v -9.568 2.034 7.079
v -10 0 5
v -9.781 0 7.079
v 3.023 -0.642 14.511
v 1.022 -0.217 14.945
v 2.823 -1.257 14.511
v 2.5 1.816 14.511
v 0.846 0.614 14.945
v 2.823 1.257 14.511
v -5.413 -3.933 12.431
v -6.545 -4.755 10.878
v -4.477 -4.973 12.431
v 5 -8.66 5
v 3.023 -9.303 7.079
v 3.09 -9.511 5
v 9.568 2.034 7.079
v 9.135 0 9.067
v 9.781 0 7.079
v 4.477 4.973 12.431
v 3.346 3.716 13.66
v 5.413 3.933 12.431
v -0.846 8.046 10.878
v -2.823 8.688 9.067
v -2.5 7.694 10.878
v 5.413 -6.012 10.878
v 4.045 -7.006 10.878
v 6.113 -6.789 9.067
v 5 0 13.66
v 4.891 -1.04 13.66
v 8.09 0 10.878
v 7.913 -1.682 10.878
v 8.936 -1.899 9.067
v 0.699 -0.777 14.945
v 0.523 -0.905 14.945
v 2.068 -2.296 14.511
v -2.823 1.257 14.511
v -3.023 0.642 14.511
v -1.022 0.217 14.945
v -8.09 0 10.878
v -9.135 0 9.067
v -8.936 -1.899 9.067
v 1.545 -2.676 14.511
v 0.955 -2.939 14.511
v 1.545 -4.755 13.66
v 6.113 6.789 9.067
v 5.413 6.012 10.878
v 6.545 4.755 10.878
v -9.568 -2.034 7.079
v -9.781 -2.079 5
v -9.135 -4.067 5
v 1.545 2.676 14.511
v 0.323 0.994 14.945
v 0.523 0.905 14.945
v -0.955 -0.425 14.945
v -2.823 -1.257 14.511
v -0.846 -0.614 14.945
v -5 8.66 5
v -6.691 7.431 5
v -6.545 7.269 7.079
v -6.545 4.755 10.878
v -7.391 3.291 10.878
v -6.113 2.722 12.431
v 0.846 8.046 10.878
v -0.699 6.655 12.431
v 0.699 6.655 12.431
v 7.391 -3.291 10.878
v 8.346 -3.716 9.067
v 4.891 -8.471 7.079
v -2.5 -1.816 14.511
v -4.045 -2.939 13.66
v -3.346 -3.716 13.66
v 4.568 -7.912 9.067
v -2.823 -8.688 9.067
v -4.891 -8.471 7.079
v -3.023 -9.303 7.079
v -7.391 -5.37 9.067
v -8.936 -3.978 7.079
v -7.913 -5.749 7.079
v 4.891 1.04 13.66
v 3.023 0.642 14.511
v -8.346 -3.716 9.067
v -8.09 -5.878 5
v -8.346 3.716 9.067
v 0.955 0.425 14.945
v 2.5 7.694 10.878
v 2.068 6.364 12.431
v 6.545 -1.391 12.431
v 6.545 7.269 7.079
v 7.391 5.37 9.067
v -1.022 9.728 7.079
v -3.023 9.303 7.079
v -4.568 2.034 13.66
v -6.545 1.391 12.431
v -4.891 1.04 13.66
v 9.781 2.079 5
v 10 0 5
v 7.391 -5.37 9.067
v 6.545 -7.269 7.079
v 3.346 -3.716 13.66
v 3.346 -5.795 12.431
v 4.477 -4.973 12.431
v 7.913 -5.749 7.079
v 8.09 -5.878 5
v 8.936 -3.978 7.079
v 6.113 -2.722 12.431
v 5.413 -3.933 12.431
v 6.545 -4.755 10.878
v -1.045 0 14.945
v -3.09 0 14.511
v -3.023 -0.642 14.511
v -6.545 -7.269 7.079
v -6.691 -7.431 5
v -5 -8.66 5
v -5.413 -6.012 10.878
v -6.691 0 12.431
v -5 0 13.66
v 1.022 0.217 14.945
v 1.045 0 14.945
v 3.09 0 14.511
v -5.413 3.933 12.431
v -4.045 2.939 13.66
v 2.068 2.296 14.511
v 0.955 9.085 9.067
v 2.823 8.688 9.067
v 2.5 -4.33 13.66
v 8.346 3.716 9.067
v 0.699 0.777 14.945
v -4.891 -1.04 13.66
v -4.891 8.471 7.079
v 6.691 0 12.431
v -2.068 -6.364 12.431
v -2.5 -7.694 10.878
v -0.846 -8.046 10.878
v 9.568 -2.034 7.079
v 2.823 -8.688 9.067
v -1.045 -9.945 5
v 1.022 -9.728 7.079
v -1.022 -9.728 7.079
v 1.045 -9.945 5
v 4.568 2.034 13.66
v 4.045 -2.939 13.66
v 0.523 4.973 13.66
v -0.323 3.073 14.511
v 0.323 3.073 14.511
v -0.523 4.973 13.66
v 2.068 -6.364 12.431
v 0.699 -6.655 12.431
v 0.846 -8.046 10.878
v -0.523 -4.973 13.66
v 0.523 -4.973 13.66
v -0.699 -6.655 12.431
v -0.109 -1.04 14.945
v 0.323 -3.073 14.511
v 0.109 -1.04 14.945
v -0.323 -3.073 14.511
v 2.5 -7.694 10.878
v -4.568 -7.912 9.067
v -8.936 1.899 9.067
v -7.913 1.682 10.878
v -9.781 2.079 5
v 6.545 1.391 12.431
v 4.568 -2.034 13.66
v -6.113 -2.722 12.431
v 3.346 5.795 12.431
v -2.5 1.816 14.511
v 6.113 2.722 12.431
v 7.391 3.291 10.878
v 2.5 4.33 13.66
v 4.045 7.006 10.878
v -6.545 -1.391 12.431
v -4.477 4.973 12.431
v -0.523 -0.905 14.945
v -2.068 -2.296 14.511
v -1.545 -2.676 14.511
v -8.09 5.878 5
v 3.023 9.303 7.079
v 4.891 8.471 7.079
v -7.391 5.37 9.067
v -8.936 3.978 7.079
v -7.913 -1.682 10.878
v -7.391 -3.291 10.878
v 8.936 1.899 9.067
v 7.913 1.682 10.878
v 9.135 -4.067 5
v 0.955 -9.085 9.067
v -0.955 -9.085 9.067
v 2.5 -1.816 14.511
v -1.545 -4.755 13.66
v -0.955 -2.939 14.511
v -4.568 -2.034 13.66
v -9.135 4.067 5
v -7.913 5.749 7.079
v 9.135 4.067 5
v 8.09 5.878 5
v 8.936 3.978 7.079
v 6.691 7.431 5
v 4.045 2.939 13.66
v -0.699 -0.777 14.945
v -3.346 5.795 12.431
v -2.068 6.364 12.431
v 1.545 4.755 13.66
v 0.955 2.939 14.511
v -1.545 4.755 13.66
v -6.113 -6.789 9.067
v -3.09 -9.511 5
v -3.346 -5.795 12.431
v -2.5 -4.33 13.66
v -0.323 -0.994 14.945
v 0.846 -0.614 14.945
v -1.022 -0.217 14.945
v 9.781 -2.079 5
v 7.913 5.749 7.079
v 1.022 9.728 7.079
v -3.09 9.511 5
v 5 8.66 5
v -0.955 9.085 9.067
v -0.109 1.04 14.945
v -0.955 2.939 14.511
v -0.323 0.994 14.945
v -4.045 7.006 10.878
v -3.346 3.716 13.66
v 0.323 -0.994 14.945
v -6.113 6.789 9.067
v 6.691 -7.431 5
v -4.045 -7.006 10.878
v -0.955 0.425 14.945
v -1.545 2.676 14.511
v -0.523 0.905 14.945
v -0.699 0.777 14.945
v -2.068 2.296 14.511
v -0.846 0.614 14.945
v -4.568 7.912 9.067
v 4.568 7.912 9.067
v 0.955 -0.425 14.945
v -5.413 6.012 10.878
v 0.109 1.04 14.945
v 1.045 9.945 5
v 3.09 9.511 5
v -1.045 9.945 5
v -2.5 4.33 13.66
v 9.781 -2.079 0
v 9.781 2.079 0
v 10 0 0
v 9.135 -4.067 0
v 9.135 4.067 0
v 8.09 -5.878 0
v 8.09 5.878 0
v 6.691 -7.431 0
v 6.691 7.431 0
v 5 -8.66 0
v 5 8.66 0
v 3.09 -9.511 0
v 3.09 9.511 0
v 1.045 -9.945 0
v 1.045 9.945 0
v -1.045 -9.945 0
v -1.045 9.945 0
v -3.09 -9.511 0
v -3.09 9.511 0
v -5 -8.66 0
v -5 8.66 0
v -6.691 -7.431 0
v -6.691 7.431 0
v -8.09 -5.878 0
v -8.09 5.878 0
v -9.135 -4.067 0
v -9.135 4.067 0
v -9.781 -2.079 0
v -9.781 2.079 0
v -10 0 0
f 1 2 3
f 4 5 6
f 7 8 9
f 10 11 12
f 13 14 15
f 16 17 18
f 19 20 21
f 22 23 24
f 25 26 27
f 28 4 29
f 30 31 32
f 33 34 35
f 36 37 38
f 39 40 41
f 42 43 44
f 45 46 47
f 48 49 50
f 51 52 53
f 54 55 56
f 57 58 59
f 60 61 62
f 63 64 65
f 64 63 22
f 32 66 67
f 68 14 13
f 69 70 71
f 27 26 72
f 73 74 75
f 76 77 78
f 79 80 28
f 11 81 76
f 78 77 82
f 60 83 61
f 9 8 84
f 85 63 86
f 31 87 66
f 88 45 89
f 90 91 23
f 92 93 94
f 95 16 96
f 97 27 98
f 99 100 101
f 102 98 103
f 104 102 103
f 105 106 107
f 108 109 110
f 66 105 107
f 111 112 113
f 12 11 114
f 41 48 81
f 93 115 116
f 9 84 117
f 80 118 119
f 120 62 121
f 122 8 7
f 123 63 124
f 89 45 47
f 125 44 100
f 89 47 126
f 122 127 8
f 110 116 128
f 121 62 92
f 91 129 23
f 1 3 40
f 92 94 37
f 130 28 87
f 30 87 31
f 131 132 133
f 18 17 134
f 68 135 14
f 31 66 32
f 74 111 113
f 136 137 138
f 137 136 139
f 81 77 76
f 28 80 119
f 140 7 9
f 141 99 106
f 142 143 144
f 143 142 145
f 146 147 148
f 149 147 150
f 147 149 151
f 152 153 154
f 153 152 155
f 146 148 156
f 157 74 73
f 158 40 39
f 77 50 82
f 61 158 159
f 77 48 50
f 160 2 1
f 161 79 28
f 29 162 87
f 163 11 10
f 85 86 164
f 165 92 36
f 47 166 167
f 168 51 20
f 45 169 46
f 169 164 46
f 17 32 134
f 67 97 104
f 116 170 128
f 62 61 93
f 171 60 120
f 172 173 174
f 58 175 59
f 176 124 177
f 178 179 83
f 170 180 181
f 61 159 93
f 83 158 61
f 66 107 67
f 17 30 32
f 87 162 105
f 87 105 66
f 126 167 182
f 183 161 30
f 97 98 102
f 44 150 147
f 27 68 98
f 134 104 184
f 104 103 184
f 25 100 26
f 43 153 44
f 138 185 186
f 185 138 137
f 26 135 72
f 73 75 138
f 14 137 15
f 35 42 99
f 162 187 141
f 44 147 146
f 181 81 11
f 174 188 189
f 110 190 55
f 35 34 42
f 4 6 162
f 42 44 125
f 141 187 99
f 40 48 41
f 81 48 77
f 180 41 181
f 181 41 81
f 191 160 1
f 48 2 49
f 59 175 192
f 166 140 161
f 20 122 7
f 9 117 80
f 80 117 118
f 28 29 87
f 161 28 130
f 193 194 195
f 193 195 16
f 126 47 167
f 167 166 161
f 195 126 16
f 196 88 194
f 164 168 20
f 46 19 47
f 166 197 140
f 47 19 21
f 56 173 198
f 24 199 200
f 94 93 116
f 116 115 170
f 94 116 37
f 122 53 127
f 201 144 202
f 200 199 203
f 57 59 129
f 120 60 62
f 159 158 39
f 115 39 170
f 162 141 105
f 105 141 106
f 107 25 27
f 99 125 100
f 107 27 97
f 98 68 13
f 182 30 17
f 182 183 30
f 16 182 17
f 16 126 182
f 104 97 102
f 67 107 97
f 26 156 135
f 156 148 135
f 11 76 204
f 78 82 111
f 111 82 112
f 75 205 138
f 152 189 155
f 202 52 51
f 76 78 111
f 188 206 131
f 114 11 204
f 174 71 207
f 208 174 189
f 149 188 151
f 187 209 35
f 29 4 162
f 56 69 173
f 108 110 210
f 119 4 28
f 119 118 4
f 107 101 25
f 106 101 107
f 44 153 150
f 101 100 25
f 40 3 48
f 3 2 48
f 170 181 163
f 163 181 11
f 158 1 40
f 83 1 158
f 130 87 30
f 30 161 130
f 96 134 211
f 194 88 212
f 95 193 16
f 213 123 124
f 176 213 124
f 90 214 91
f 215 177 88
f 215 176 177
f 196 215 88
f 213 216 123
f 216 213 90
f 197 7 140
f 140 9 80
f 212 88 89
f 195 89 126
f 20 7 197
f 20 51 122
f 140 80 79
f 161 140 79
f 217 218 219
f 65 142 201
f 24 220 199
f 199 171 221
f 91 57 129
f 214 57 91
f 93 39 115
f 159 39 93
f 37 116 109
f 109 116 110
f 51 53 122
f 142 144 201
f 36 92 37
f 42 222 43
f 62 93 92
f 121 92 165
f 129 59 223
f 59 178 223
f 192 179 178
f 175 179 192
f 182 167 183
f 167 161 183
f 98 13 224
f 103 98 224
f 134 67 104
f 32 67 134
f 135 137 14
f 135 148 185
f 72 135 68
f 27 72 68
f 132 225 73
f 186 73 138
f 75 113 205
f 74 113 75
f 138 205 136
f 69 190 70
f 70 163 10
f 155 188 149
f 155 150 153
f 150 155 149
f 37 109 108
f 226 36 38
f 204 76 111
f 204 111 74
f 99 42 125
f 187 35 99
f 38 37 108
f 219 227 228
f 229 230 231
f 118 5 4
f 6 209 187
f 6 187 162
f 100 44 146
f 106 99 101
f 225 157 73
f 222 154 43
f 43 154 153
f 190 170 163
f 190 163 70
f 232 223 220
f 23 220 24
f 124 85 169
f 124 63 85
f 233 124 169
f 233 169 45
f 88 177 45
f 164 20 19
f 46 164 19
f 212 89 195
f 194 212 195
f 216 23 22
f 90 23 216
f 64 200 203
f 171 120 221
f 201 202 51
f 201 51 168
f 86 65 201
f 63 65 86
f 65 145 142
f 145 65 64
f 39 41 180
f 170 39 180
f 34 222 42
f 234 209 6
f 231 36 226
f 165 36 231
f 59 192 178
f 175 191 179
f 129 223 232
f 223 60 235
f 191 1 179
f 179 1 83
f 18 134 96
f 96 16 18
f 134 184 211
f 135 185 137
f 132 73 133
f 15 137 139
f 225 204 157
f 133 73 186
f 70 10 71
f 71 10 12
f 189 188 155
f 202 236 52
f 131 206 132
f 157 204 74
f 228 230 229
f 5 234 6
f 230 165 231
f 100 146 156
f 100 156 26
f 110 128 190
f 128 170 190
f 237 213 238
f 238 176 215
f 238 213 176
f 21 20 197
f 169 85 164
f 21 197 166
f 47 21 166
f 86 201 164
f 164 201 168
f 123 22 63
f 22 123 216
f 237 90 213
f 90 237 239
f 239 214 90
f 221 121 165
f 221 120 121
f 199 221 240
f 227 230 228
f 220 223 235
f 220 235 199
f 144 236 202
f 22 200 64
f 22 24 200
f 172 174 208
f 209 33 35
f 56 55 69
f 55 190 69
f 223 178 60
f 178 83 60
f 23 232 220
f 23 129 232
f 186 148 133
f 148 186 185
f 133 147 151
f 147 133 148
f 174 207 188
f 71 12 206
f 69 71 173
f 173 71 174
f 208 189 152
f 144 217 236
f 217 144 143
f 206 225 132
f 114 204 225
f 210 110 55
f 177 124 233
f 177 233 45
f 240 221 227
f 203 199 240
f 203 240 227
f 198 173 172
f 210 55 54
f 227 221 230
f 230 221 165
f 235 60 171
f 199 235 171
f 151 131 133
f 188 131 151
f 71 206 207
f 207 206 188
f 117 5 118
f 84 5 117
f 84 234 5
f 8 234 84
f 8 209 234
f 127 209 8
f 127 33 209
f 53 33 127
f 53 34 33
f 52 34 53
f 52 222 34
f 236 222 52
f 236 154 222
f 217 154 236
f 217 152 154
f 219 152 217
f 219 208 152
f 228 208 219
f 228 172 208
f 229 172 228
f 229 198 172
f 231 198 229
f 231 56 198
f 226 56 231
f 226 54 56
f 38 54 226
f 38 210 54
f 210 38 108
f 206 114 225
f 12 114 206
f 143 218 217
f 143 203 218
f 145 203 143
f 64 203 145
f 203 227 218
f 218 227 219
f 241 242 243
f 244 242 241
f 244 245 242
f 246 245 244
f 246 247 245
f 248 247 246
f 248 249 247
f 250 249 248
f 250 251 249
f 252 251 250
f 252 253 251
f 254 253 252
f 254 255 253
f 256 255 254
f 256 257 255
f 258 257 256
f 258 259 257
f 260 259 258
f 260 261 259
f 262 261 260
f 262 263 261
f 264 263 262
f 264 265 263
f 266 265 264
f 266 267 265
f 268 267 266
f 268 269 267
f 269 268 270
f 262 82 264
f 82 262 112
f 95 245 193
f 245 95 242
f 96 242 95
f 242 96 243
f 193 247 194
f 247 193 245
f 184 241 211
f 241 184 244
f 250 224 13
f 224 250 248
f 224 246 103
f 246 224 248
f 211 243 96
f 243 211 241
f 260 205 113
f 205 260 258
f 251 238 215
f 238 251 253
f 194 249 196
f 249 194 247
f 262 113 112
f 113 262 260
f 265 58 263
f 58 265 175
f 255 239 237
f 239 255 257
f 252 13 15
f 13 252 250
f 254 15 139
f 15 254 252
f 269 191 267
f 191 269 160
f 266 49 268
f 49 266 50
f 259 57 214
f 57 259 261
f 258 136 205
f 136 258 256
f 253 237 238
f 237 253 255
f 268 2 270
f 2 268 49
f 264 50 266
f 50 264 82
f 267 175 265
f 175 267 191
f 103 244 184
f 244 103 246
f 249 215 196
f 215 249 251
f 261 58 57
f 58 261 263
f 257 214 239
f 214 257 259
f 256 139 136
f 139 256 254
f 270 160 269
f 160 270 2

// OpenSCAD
cylinder(h=5, r1 = 10, r2 = 10);

difference()
{
	translate([0,0,5])
	sphere(10);

	translate([0,0,-5])
	cube([20,20,10],true);
}
